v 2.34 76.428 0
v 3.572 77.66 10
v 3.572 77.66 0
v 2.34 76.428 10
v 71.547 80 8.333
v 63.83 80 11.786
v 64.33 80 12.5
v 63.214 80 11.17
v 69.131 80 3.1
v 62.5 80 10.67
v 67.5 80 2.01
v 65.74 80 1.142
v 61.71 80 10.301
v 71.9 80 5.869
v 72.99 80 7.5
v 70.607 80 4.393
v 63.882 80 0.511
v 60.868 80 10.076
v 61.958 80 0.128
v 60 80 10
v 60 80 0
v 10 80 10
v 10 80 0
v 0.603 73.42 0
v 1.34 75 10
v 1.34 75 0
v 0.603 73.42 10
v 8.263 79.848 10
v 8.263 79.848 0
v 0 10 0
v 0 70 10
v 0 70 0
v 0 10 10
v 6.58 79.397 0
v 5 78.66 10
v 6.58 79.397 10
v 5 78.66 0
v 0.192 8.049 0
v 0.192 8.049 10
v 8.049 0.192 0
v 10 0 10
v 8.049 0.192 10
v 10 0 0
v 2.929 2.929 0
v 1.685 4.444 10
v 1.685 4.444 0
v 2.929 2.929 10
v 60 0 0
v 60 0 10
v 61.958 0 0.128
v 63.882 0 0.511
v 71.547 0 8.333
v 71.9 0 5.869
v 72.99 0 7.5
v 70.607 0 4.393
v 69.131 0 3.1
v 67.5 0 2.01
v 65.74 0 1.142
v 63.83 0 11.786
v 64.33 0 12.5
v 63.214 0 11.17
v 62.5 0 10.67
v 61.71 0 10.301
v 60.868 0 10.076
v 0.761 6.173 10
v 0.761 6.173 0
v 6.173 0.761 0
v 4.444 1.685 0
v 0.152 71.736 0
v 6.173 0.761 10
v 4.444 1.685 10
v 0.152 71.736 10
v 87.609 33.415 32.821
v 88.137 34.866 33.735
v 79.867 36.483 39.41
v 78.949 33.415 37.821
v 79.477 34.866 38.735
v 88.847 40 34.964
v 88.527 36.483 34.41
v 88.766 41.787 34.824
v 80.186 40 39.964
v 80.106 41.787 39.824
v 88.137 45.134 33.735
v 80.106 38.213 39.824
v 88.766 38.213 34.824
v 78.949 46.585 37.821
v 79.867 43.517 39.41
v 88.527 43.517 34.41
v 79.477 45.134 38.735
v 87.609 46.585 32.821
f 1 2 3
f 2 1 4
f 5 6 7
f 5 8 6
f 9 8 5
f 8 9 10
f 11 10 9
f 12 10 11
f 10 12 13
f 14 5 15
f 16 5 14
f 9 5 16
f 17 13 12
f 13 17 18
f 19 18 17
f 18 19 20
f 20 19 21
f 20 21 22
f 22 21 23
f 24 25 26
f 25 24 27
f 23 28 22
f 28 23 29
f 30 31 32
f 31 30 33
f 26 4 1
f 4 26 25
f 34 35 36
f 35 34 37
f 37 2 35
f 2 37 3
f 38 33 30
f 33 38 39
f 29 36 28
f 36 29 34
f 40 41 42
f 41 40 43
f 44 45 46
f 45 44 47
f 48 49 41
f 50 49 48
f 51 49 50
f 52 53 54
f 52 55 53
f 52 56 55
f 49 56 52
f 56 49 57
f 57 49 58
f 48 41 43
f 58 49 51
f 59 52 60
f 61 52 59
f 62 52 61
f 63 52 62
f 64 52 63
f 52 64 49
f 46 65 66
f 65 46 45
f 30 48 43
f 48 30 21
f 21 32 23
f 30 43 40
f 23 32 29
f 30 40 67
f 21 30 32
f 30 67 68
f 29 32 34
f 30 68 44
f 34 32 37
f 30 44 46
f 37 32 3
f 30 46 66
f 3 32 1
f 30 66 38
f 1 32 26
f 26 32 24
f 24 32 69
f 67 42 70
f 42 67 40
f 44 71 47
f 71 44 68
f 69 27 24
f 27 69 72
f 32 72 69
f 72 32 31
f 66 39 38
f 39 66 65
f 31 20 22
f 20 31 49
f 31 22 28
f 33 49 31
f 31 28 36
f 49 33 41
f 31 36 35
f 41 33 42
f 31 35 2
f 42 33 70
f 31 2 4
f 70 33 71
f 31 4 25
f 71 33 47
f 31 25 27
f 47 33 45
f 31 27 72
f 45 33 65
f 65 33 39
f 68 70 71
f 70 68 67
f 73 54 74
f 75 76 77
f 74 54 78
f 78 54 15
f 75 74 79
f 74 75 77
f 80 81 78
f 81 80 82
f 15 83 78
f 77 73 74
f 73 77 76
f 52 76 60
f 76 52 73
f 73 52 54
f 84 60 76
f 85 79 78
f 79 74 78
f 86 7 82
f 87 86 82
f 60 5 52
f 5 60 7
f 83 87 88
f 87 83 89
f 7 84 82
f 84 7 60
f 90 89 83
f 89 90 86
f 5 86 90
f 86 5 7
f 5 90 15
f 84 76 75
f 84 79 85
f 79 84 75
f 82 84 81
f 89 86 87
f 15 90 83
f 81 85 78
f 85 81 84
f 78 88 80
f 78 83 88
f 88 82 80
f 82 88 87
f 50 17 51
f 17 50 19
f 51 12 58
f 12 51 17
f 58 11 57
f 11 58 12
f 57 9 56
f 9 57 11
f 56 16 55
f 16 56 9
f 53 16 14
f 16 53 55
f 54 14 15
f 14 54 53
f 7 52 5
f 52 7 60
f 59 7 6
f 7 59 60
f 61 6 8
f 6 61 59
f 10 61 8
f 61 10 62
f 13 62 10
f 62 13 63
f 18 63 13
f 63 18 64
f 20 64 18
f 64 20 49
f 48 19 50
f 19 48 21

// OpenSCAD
// Generated by Parametrix
ca_demoSheetFold_faceCut_000 = [ [ 10.0000, 0.0000 ],[ 60.0000, 0.0000 ],[ 60.0000, 80.0000 ],[ 10.0000, 80.0000 ],[ 8.2635, 79.8481 ],[ 6.5798, 79.3969 ],[ 5.0000, 78.6603 ],[ 3.5721, 77.6604 ],[ 2.3396, 76.4279 ],[ 1.3397, 75.0000 ],[ 0.6031, 73.4202 ],[ 0.1519, 71.7365 ],[ 0.0000, 70.0000 ],[ 0.0000, 10.0000 ],[ 0.1921, 8.0491 ],[ 0.7612, 6.1732 ],[ 1.6853, 4.4443 ],[ 2.9289, 2.9289 ],[ 4.4443, 1.6853 ],[ 6.1732, 0.7612 ],[ 8.0491, 0.1921 ],[ 10.0000, 0.0000 ] ];
cb_demoSheetFold_faceCut_000 = [  0, 1, 2, 3, 4, 5, 6, 7, 8, 9, 10, 11, 12, 13, 14, 15, 16, 17, 18, 19, 20, 21 ];
ca_demoSheetFold_faceCut_001 = [ [ 60.0000, 0.0000 ],[ 70.4720, 0.0000 ],[ 70.4720, 80.0000 ],[ 60.0000, 80.0000 ],[ 60.0000, 0.0000 ] ];
cb_demoSheetFold_faceCut_001 = [  22, 23, 24, 25, 26 ];
ca_demoSheetFold_faceCut_002 = [ [ 70.4720, 0.0000 ],[ 99.7101, 33.4150 ],[ 100.7659, 34.8662 ],[ 101.5453, 36.4827 ],[ 102.0233, 38.2126 ],[ 102.1843, 40.0000 ],[ 102.0233, 41.7874 ],[ 101.5453, 43.5173 ],[ 100.7659, 45.1338 ],[ 99.7101, 46.5850 ],[ 70.4720, 80.0000 ],[ 70.4720, 0.0000 ] ];
cb_demoSheetFold_faceCut_002 = [  27, 28, 29, 30, 31, 32, 33, 34, 35, 36, 37, 38 ];
a_demoSheetFold_faceCut = concat(ca_demoSheetFold_faceCut_000, ca_demoSheetFold_faceCut_001, ca_demoSheetFold_faceCut_002);
b_demoSheetFold_faceCut = [cb_demoSheetFold_faceCut_000, cb_demoSheetFold_faceCut_001, cb_demoSheetFold_faceCut_002];
ca_demoSheetFold_facet1_000 = [ [ 10.0000, 0.0000 ],[ 60.0000, 0.0000 ],[ 60.0000, 80.0000 ],[ 10.0000, 80.0000 ],[ 8.2635, 79.8481 ],[ 6.5798, 79.3969 ],[ 5.0000, 78.6603 ],[ 3.5721, 77.6604 ],[ 2.3396, 76.4279 ],[ 1.3397, 75.0000 ],[ 0.6031, 73.4202 ],[ 0.1519, 71.7365 ],[ 0.0000, 70.0000 ],[ 0.0000, 10.0000 ],[ 0.1921, 8.0491 ],[ 0.7612, 6.1732 ],[ 1.6853, 4.4443 ],[ 2.9289, 2.9289 ],[ 4.4443, 1.6853 ],[ 6.1732, 0.7612 ],[ 8.0491, 0.1921 ],[ 10.0000, 0.0000 ] ];
cb_demoSheetFold_facet1_000 = [  0, 1, 2, 3, 4, 5, 6, 7, 8, 9, 10, 11, 12, 13, 14, 15, 16, 17, 18, 19, 20, 21 ];
a_demoSheetFold_facet1 = concat(ca_demoSheetFold_facet1_000);
b_demoSheetFold_facet1 = [cb_demoSheetFold_facet1_000];
ca_demoSheetFold_facet3_000 = [ [ 70.4720, 0.0000 ],[ 99.7101, 33.4150 ],[ 100.7659, 34.8662 ],[ 101.5453, 36.4827 ],[ 102.0233, 38.2126 ],[ 102.1843, 40.0000 ],[ 102.0233, 41.7874 ],[ 101.5453, 43.5173 ],[ 100.7659, 45.1338 ],[ 99.7101, 46.5850 ],[ 70.4720, 80.0000 ],[ 70.4720, 0.0000 ] ];
cb_demoSheetFold_facet3_000 = [  0, 1, 2, 3, 4, 5, 6, 7, 8, 9, 10, 11 ];
a_demoSheetFold_facet3 = concat(ca_demoSheetFold_facet3_000);
b_demoSheetFold_facet3 = [cb_demoSheetFold_facet3_000];
ca_demoSheetFold_facePattern_000 = [ [ 10.0000, 0.0000 ],[ 60.0000, 0.0000 ],[ 60.0000, 80.0000 ],[ 10.0000, 80.0000 ],[ 8.2635, 79.8481 ],[ 6.5798, 79.3969 ],[ 5.0000, 78.6603 ],[ 3.5721, 77.6604 ],[ 2.3396, 76.4279 ],[ 1.3397, 75.0000 ],[ 0.6031, 73.4202 ],[ 0.1519, 71.7365 ],[ 0.0000, 70.0000 ],[ 0.0000, 10.0000 ],[ 0.1921, 8.0491 ],[ 0.7612, 6.1732 ],[ 1.6853, 4.4443 ],[ 2.9289, 2.9289 ],[ 4.4443, 1.6853 ],[ 6.1732, 0.7612 ],[ 8.0491, 0.1921 ],[ 10.0000, 0.0000 ] ];
cb_demoSheetFold_facePattern_000 = [  0, 1, 2, 3, 4, 5, 6, 7, 8, 9, 10, 11, 12, 13, 14, 15, 16, 17, 18, 19, 20, 21 ];
ca_demoSheetFold_facePattern_001 = [ [ 70.4720, 0.0000 ],[ 99.7101, 33.4150 ],[ 100.7659, 34.8662 ],[ 101.5453, 36.4827 ],[ 102.0233, 38.2126 ],[ 102.1843, 40.0000 ],[ 102.0233, 41.7874 ],[ 101.5453, 43.5173 ],[ 100.7659, 45.1338 ],[ 99.7101, 46.5850 ],[ 70.4720, 80.0000 ],[ 70.4720, 0.0000 ] ];
cb_demoSheetFold_facePattern_001 = [  22, 23, 24, 25, 26, 27, 28, 29, 30, 31, 32, 33 ];
a_demoSheetFold_facePattern = concat(ca_demoSheetFold_facePattern_000, ca_demoSheetFold_facePattern_001);
b_demoSheetFold_facePattern = [cb_demoSheetFold_facePattern_000, cb_demoSheetFold_facePattern_001];
ca_demoSheetFold_SFG_f00_000 = [ [ 10.0000, 0.0000 ],[ 60.0000, 0.0000 ],[ 60.0000, 80.0000 ],[ 10.0000, 80.0000 ],[ 8.2635, 79.8481 ],[ 6.5798, 79.3969 ],[ 5.0000, 78.6603 ],[ 3.5721, 77.6604 ],[ 2.3396, 76.4279 ],[ 1.3397, 75.0000 ],[ 0.6031, 73.4202 ],[ 0.1519, 71.7365 ],[ 0.0000, 70.0000 ],[ 0.0000, 10.0000 ],[ 0.1921, 8.0491 ],[ 0.7612, 6.1732 ],[ 1.6853, 4.4443 ],[ 2.9289, 2.9289 ],[ 4.4443, 1.6853 ],[ 6.1732, 0.7612 ],[ 8.0491, 0.1921 ],[ 10.0000, 0.0000 ] ];
cb_demoSheetFold_SFG_f00_000 = [  0, 1, 2, 3, 4, 5, 6, 7, 8, 9, 10, 11, 12, 13, 14, 15, 16, 17, 18, 19, 20, 21 ];
a_demoSheetFold_SFG_f00 = concat(ca_demoSheetFold_SFG_f00_000);
b_demoSheetFold_SFG_f00 = [cb_demoSheetFold_SFG_f00_000];
ca_demoSheetFold_SFG_f01_000 = [ [ 0.0000, 0.0000 ],[ 29.2381, 33.4150 ],[ 30.2939, 34.8662 ],[ 31.0733, 36.4827 ],[ 31.5513, 38.2126 ],[ 31.7123, 40.0000 ],[ 31.5513, 41.7874 ],[ 31.0733, 43.5173 ],[ 30.2939, 45.1338 ],[ 29.2381, 46.5850 ],[ 0.0000, 80.0000 ],[ 0.0000, 0.0000 ] ];
cb_demoSheetFold_SFG_f01_000 = [  0, 1, 2, 3, 4, 5, 6, 7, 8, 9, 10, 11 ];
a_demoSheetFold_SFG_f01 = concat(ca_demoSheetFold_SFG_f01_000);
b_demoSheetFold_SFG_f01 = [cb_demoSheetFold_SFG_f01_000];
ca_demoSheetFold_SFG_fj00_000 = [ [ 0.0000, 0.0000 ],[ 1.9579, 0.1283 ],[ 3.8823, 0.5111 ],[ 5.7403, 1.1418 ],[ 7.5000, 2.0096 ],[ 9.1314, 3.0997 ],[ 10.6066, 4.3934 ],[ 11.9003, 5.8686 ],[ 12.9904, 7.5000 ],[ 4.3301, 12.5000 ],[ 3.8302, 11.7861 ],[ 3.2139, 11.1698 ],[ 2.5000, 10.6699 ],[ 1.7101, 10.3015 ],[ 0.8682, 10.0760 ],[ -0.0000, 10.0000 ],[ 0.0000, 0.0000 ] ];
cb_demoSheetFold_SFG_fj00_000 = [  0, 1, 2, 3, 4, 5, 6, 7, 8, 9, 10, 11, 12, 13, 14, 15, 16 ];
a_demoSheetFold_SFG_fj00 = concat(ca_demoSheetFold_SFG_fj00_000);
b_demoSheetFold_SFG_fj00 = [cb_demoSheetFold_SFG_fj00_000];

module subpax_SFG_f00 () {
	translate( [ 0, 0, 0 ])
		rotate( [ 0, 0, 0 ])
			   linear_extrude(height = 10) polygon(a_demoSheetFold_SFG_f00, b_demoSheetFold_SFG_f00);
}

module subpax_SFG_f01 () {
	translate( [ 72.99038105676658, -7.954314290436801e-16, 7.5 ])
		rotate( [ -6.07664850350169e-15, -59.99999999999999, 3.5083546492674368e-15 ])
			   linear_extrude(height = 10) polygon(a_demoSheetFold_SFG_f01, b_demoSheetFold_SFG_f01);
}

module subpax_SFG_fj00 () {
	translate( [ 60, 80, 0 ])
		rotate( [ 90, 0, 0 ])
			   linear_extrude(height = 80) polygon(a_demoSheetFold_SFG_fj00, b_demoSheetFold_SFG_fj00);
}

module pax_demoSheetFold () {
	union () {
		subpax_SFG_f00();
subpax_SFG_f01();
subpax_SFG_fj00();
	}
}

pax_demoSheetFold();
